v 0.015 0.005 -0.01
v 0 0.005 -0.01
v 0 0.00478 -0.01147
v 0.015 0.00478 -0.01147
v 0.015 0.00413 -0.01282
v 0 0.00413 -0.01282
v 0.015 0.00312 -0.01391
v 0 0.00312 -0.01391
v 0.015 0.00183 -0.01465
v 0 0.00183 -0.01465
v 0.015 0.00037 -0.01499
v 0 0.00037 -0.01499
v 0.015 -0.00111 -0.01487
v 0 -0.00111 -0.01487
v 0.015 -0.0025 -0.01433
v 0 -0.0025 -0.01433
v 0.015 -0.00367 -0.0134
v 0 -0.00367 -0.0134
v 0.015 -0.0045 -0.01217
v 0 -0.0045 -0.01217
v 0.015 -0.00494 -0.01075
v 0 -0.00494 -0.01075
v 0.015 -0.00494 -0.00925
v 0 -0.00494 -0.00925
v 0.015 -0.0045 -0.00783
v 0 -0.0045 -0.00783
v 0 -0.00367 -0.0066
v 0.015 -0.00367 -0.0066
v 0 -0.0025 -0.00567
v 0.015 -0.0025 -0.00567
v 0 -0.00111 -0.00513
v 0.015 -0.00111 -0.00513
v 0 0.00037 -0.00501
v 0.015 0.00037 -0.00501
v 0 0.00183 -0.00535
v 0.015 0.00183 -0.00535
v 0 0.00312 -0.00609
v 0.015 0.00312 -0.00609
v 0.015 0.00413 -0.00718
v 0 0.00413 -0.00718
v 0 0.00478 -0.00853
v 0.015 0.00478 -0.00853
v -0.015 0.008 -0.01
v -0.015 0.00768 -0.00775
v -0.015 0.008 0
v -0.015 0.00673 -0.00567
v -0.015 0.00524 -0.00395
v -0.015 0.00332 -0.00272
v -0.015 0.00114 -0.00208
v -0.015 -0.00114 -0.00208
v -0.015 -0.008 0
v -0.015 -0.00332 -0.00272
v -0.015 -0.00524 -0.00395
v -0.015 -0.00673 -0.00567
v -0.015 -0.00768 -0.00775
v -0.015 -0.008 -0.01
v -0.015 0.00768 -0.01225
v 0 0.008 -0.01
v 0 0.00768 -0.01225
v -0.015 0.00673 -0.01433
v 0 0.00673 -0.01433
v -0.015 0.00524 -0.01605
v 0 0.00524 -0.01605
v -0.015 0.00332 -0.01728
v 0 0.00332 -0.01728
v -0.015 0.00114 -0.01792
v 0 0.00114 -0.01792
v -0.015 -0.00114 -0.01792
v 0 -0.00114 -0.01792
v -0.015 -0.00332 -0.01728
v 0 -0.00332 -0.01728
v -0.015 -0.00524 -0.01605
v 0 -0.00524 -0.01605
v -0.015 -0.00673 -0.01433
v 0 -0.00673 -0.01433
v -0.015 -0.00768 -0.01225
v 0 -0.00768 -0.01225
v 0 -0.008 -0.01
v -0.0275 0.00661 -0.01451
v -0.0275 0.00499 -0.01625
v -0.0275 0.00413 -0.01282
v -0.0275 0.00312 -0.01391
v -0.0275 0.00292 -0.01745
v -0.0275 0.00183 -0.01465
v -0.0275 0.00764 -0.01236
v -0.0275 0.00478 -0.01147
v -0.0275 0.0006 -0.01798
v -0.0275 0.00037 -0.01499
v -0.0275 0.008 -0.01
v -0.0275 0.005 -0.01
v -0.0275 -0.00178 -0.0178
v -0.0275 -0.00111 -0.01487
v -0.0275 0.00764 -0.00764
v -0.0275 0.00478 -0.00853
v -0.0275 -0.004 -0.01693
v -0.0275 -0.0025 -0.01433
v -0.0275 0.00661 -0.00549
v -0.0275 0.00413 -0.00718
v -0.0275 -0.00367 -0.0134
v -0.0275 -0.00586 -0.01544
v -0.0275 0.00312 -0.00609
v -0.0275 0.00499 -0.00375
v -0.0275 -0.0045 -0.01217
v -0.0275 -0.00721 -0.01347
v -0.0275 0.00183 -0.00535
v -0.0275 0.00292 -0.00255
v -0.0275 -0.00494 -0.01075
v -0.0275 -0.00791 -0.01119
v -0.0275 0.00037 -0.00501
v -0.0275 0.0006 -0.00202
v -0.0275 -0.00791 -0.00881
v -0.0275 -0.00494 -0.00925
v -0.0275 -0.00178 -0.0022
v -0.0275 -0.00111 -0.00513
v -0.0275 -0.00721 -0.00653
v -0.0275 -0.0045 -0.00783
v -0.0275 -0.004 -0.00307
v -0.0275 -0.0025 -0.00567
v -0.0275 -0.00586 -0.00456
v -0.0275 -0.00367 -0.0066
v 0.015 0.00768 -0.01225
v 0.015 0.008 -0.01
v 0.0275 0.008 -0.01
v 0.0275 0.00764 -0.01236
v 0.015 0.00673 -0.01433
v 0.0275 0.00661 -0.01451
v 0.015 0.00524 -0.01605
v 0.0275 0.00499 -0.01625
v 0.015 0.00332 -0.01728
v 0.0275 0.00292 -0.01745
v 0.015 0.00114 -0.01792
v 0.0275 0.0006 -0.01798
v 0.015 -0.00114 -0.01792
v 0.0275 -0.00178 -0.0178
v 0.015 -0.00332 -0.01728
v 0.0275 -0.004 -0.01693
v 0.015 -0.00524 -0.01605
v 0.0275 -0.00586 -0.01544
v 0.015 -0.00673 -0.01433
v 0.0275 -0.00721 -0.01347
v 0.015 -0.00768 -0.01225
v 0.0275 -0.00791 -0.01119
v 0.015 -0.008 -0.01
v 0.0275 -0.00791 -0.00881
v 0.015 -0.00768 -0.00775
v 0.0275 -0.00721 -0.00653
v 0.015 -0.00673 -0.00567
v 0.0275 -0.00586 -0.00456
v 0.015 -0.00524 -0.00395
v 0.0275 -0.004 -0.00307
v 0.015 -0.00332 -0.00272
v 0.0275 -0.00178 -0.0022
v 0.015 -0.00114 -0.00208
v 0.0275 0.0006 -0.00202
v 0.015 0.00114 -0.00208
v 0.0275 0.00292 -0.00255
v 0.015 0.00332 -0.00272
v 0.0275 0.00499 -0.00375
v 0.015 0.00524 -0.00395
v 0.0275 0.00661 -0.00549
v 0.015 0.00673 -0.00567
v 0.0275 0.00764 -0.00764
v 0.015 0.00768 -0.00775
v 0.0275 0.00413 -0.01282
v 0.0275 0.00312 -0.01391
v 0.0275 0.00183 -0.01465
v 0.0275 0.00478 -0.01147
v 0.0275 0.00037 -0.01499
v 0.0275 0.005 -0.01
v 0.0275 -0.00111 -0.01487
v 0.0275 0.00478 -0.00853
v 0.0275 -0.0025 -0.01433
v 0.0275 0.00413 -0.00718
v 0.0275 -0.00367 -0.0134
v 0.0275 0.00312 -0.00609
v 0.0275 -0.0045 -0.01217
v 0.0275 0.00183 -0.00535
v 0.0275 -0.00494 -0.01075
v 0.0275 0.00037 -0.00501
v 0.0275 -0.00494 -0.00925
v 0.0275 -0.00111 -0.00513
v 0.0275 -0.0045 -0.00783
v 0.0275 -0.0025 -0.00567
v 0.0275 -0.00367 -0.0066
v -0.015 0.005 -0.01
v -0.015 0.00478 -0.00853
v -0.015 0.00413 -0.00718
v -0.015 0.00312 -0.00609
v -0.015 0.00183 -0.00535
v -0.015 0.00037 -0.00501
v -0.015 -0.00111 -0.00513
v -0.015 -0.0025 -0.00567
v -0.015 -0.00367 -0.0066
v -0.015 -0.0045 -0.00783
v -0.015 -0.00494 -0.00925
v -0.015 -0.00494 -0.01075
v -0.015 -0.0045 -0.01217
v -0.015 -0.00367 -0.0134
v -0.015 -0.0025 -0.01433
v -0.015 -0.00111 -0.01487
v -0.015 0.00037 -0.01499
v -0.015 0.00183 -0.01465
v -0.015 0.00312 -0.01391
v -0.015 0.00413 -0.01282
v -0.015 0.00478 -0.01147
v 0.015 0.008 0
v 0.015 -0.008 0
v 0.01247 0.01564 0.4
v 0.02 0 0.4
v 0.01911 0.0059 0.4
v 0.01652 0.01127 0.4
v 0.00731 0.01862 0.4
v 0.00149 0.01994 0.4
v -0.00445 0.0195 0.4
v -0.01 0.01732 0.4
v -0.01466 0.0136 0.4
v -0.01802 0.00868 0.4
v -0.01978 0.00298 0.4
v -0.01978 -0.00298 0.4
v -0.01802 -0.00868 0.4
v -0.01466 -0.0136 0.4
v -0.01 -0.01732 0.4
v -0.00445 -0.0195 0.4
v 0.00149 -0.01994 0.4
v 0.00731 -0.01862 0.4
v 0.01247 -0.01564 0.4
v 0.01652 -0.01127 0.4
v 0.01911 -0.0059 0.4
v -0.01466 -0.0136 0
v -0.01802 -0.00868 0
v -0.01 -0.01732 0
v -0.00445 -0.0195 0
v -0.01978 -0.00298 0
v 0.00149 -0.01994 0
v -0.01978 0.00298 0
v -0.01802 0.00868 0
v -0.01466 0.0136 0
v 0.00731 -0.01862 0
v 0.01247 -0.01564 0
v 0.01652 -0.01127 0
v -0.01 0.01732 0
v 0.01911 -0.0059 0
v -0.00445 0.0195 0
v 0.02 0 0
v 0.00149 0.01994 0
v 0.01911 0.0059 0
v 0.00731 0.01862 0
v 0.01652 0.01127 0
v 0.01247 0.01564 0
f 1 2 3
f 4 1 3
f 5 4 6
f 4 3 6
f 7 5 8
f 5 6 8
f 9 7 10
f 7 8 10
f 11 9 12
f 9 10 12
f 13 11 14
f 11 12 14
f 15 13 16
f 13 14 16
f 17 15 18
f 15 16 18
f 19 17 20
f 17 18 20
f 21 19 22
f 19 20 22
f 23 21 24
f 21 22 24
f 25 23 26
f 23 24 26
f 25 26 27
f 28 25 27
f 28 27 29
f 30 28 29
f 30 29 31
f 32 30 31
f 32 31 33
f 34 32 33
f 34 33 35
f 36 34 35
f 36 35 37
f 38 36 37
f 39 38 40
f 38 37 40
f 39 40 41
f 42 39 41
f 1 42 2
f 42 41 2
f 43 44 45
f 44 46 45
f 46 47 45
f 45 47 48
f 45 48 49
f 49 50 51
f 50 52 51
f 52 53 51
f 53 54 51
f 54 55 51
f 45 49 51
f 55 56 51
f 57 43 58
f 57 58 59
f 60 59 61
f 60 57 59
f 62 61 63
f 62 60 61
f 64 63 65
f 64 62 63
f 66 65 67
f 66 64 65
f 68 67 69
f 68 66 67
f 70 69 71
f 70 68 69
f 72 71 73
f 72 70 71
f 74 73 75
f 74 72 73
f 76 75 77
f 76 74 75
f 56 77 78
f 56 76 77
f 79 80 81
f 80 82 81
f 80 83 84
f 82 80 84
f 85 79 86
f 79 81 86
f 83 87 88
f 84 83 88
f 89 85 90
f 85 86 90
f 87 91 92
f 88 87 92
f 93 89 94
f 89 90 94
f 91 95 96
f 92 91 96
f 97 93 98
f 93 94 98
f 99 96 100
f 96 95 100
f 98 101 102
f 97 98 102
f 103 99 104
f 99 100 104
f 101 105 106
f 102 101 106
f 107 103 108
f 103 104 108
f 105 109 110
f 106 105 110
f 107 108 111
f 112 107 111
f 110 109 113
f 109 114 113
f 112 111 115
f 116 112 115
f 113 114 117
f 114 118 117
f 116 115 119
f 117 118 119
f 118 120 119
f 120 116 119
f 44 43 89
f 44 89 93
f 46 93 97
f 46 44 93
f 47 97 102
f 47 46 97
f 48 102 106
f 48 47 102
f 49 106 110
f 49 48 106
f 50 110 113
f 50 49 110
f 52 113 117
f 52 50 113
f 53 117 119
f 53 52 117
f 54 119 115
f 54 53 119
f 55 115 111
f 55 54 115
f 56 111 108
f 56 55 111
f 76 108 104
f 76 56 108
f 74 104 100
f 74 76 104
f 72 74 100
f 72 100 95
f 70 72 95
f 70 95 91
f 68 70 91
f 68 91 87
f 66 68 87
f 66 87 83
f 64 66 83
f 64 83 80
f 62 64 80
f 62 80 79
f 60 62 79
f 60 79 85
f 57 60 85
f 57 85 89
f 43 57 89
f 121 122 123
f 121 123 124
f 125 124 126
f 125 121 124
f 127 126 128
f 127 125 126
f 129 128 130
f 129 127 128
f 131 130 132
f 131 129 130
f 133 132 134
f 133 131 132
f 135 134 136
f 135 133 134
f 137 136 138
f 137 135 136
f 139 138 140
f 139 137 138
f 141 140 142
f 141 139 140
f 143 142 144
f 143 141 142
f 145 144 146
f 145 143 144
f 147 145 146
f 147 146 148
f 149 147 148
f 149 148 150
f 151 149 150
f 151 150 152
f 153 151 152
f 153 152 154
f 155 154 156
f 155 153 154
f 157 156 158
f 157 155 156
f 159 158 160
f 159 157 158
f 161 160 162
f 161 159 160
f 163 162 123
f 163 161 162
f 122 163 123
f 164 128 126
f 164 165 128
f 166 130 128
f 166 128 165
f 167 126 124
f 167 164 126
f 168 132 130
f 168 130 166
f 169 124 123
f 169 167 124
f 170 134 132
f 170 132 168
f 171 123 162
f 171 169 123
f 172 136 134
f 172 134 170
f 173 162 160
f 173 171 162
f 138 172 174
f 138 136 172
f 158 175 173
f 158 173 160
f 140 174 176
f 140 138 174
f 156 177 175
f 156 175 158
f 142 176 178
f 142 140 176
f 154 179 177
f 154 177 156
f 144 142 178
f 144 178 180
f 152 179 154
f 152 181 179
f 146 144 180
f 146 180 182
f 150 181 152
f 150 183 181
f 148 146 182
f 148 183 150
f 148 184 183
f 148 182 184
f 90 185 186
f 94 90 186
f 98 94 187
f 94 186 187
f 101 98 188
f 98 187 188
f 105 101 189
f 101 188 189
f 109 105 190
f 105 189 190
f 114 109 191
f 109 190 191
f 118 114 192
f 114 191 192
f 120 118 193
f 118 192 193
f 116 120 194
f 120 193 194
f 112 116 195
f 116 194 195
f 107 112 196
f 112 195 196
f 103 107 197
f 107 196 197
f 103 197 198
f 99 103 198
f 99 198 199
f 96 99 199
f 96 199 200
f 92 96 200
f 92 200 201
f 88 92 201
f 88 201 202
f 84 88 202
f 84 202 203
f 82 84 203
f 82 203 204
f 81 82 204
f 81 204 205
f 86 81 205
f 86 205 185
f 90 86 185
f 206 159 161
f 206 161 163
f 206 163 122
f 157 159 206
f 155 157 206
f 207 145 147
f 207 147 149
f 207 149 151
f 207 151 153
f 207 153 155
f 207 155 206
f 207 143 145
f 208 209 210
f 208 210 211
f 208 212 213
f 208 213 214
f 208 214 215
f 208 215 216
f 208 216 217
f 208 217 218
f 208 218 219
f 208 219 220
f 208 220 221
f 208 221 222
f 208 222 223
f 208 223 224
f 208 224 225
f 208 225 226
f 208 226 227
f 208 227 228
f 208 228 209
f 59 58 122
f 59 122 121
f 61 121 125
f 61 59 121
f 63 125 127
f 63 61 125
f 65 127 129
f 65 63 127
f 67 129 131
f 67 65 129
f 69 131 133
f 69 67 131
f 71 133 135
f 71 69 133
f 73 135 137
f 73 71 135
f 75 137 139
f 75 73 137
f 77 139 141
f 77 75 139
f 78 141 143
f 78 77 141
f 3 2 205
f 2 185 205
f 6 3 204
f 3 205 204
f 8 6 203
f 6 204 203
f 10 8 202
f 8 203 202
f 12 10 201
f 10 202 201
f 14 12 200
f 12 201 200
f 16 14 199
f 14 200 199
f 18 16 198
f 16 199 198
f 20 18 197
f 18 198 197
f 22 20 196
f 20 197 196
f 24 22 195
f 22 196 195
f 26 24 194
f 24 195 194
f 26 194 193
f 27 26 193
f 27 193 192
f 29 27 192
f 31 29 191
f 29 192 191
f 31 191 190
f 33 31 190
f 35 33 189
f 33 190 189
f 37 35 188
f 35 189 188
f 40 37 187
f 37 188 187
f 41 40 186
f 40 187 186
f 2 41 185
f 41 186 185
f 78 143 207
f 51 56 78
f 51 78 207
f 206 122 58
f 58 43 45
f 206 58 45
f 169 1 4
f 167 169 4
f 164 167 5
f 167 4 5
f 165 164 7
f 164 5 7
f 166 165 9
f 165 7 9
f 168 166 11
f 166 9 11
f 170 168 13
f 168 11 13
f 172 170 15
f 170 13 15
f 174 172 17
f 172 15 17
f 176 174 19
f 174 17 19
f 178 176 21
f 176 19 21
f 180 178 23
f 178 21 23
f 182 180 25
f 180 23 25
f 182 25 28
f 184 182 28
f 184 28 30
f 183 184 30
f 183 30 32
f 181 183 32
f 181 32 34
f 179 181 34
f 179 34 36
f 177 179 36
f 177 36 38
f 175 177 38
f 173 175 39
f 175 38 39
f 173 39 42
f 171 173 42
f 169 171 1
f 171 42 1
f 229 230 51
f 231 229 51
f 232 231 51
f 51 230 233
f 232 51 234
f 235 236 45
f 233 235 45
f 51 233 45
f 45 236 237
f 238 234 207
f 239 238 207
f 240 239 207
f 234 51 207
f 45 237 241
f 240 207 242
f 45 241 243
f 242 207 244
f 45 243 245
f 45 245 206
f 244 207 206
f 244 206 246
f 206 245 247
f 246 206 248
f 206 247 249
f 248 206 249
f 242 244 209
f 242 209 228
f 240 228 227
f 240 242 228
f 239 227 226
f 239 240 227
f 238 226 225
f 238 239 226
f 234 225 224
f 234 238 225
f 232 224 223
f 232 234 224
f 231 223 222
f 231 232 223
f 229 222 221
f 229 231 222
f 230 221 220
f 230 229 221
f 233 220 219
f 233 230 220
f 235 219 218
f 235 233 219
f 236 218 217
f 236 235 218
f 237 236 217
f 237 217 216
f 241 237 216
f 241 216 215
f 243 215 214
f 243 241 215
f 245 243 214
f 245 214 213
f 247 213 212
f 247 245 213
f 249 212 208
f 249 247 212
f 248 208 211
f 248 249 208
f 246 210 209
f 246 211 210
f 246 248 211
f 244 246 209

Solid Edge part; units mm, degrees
sketch "Sketch1" plane through (0, 0, 0) normal (0, 0, 1) x (1, 0, 0)
  circle A0 centre (0, 0) radius 0.02
  dimension "D1" = 0.04
extrude "Protrusion1" add sketch "Sketch1" along normal blind 0.4
sketch "Sketch2" plane through (0, 0, 0) normal (1, 0, 0) x (0, 1, 0)
  line L0 (0.008, -0.01) -> (0.008, 0)
  line L1 (-0.008, 0) -> (0.008, 0)
  line L2 (-0.008, -0.01) -> (-0.008, 0)
  arc A0 (-0.008, -0.01) -> (0.008, -0.01) centre (0, -0.01) ccw
  circle A1 centre (0, -0.01) radius 0.005
  dimension "D1" = 0.016
  dimension "D2" = 0.01
  dimension "D3" = 0.01
extrude "Ausprägung_2" add sketch "Sketch2" along normal mid plane 0.03
sketch "Sketch3" plane through (0, 0, 0) normal (1, 0, 0) x (0, 1, 0)
  circle A0 centre (0, -0.01) radius 0.005
  circle A1 centre (0, -0.01) radius 0.008
extrude "Ausprägung_3" add sketch "Sketch3" along normal mid plane 0.055
